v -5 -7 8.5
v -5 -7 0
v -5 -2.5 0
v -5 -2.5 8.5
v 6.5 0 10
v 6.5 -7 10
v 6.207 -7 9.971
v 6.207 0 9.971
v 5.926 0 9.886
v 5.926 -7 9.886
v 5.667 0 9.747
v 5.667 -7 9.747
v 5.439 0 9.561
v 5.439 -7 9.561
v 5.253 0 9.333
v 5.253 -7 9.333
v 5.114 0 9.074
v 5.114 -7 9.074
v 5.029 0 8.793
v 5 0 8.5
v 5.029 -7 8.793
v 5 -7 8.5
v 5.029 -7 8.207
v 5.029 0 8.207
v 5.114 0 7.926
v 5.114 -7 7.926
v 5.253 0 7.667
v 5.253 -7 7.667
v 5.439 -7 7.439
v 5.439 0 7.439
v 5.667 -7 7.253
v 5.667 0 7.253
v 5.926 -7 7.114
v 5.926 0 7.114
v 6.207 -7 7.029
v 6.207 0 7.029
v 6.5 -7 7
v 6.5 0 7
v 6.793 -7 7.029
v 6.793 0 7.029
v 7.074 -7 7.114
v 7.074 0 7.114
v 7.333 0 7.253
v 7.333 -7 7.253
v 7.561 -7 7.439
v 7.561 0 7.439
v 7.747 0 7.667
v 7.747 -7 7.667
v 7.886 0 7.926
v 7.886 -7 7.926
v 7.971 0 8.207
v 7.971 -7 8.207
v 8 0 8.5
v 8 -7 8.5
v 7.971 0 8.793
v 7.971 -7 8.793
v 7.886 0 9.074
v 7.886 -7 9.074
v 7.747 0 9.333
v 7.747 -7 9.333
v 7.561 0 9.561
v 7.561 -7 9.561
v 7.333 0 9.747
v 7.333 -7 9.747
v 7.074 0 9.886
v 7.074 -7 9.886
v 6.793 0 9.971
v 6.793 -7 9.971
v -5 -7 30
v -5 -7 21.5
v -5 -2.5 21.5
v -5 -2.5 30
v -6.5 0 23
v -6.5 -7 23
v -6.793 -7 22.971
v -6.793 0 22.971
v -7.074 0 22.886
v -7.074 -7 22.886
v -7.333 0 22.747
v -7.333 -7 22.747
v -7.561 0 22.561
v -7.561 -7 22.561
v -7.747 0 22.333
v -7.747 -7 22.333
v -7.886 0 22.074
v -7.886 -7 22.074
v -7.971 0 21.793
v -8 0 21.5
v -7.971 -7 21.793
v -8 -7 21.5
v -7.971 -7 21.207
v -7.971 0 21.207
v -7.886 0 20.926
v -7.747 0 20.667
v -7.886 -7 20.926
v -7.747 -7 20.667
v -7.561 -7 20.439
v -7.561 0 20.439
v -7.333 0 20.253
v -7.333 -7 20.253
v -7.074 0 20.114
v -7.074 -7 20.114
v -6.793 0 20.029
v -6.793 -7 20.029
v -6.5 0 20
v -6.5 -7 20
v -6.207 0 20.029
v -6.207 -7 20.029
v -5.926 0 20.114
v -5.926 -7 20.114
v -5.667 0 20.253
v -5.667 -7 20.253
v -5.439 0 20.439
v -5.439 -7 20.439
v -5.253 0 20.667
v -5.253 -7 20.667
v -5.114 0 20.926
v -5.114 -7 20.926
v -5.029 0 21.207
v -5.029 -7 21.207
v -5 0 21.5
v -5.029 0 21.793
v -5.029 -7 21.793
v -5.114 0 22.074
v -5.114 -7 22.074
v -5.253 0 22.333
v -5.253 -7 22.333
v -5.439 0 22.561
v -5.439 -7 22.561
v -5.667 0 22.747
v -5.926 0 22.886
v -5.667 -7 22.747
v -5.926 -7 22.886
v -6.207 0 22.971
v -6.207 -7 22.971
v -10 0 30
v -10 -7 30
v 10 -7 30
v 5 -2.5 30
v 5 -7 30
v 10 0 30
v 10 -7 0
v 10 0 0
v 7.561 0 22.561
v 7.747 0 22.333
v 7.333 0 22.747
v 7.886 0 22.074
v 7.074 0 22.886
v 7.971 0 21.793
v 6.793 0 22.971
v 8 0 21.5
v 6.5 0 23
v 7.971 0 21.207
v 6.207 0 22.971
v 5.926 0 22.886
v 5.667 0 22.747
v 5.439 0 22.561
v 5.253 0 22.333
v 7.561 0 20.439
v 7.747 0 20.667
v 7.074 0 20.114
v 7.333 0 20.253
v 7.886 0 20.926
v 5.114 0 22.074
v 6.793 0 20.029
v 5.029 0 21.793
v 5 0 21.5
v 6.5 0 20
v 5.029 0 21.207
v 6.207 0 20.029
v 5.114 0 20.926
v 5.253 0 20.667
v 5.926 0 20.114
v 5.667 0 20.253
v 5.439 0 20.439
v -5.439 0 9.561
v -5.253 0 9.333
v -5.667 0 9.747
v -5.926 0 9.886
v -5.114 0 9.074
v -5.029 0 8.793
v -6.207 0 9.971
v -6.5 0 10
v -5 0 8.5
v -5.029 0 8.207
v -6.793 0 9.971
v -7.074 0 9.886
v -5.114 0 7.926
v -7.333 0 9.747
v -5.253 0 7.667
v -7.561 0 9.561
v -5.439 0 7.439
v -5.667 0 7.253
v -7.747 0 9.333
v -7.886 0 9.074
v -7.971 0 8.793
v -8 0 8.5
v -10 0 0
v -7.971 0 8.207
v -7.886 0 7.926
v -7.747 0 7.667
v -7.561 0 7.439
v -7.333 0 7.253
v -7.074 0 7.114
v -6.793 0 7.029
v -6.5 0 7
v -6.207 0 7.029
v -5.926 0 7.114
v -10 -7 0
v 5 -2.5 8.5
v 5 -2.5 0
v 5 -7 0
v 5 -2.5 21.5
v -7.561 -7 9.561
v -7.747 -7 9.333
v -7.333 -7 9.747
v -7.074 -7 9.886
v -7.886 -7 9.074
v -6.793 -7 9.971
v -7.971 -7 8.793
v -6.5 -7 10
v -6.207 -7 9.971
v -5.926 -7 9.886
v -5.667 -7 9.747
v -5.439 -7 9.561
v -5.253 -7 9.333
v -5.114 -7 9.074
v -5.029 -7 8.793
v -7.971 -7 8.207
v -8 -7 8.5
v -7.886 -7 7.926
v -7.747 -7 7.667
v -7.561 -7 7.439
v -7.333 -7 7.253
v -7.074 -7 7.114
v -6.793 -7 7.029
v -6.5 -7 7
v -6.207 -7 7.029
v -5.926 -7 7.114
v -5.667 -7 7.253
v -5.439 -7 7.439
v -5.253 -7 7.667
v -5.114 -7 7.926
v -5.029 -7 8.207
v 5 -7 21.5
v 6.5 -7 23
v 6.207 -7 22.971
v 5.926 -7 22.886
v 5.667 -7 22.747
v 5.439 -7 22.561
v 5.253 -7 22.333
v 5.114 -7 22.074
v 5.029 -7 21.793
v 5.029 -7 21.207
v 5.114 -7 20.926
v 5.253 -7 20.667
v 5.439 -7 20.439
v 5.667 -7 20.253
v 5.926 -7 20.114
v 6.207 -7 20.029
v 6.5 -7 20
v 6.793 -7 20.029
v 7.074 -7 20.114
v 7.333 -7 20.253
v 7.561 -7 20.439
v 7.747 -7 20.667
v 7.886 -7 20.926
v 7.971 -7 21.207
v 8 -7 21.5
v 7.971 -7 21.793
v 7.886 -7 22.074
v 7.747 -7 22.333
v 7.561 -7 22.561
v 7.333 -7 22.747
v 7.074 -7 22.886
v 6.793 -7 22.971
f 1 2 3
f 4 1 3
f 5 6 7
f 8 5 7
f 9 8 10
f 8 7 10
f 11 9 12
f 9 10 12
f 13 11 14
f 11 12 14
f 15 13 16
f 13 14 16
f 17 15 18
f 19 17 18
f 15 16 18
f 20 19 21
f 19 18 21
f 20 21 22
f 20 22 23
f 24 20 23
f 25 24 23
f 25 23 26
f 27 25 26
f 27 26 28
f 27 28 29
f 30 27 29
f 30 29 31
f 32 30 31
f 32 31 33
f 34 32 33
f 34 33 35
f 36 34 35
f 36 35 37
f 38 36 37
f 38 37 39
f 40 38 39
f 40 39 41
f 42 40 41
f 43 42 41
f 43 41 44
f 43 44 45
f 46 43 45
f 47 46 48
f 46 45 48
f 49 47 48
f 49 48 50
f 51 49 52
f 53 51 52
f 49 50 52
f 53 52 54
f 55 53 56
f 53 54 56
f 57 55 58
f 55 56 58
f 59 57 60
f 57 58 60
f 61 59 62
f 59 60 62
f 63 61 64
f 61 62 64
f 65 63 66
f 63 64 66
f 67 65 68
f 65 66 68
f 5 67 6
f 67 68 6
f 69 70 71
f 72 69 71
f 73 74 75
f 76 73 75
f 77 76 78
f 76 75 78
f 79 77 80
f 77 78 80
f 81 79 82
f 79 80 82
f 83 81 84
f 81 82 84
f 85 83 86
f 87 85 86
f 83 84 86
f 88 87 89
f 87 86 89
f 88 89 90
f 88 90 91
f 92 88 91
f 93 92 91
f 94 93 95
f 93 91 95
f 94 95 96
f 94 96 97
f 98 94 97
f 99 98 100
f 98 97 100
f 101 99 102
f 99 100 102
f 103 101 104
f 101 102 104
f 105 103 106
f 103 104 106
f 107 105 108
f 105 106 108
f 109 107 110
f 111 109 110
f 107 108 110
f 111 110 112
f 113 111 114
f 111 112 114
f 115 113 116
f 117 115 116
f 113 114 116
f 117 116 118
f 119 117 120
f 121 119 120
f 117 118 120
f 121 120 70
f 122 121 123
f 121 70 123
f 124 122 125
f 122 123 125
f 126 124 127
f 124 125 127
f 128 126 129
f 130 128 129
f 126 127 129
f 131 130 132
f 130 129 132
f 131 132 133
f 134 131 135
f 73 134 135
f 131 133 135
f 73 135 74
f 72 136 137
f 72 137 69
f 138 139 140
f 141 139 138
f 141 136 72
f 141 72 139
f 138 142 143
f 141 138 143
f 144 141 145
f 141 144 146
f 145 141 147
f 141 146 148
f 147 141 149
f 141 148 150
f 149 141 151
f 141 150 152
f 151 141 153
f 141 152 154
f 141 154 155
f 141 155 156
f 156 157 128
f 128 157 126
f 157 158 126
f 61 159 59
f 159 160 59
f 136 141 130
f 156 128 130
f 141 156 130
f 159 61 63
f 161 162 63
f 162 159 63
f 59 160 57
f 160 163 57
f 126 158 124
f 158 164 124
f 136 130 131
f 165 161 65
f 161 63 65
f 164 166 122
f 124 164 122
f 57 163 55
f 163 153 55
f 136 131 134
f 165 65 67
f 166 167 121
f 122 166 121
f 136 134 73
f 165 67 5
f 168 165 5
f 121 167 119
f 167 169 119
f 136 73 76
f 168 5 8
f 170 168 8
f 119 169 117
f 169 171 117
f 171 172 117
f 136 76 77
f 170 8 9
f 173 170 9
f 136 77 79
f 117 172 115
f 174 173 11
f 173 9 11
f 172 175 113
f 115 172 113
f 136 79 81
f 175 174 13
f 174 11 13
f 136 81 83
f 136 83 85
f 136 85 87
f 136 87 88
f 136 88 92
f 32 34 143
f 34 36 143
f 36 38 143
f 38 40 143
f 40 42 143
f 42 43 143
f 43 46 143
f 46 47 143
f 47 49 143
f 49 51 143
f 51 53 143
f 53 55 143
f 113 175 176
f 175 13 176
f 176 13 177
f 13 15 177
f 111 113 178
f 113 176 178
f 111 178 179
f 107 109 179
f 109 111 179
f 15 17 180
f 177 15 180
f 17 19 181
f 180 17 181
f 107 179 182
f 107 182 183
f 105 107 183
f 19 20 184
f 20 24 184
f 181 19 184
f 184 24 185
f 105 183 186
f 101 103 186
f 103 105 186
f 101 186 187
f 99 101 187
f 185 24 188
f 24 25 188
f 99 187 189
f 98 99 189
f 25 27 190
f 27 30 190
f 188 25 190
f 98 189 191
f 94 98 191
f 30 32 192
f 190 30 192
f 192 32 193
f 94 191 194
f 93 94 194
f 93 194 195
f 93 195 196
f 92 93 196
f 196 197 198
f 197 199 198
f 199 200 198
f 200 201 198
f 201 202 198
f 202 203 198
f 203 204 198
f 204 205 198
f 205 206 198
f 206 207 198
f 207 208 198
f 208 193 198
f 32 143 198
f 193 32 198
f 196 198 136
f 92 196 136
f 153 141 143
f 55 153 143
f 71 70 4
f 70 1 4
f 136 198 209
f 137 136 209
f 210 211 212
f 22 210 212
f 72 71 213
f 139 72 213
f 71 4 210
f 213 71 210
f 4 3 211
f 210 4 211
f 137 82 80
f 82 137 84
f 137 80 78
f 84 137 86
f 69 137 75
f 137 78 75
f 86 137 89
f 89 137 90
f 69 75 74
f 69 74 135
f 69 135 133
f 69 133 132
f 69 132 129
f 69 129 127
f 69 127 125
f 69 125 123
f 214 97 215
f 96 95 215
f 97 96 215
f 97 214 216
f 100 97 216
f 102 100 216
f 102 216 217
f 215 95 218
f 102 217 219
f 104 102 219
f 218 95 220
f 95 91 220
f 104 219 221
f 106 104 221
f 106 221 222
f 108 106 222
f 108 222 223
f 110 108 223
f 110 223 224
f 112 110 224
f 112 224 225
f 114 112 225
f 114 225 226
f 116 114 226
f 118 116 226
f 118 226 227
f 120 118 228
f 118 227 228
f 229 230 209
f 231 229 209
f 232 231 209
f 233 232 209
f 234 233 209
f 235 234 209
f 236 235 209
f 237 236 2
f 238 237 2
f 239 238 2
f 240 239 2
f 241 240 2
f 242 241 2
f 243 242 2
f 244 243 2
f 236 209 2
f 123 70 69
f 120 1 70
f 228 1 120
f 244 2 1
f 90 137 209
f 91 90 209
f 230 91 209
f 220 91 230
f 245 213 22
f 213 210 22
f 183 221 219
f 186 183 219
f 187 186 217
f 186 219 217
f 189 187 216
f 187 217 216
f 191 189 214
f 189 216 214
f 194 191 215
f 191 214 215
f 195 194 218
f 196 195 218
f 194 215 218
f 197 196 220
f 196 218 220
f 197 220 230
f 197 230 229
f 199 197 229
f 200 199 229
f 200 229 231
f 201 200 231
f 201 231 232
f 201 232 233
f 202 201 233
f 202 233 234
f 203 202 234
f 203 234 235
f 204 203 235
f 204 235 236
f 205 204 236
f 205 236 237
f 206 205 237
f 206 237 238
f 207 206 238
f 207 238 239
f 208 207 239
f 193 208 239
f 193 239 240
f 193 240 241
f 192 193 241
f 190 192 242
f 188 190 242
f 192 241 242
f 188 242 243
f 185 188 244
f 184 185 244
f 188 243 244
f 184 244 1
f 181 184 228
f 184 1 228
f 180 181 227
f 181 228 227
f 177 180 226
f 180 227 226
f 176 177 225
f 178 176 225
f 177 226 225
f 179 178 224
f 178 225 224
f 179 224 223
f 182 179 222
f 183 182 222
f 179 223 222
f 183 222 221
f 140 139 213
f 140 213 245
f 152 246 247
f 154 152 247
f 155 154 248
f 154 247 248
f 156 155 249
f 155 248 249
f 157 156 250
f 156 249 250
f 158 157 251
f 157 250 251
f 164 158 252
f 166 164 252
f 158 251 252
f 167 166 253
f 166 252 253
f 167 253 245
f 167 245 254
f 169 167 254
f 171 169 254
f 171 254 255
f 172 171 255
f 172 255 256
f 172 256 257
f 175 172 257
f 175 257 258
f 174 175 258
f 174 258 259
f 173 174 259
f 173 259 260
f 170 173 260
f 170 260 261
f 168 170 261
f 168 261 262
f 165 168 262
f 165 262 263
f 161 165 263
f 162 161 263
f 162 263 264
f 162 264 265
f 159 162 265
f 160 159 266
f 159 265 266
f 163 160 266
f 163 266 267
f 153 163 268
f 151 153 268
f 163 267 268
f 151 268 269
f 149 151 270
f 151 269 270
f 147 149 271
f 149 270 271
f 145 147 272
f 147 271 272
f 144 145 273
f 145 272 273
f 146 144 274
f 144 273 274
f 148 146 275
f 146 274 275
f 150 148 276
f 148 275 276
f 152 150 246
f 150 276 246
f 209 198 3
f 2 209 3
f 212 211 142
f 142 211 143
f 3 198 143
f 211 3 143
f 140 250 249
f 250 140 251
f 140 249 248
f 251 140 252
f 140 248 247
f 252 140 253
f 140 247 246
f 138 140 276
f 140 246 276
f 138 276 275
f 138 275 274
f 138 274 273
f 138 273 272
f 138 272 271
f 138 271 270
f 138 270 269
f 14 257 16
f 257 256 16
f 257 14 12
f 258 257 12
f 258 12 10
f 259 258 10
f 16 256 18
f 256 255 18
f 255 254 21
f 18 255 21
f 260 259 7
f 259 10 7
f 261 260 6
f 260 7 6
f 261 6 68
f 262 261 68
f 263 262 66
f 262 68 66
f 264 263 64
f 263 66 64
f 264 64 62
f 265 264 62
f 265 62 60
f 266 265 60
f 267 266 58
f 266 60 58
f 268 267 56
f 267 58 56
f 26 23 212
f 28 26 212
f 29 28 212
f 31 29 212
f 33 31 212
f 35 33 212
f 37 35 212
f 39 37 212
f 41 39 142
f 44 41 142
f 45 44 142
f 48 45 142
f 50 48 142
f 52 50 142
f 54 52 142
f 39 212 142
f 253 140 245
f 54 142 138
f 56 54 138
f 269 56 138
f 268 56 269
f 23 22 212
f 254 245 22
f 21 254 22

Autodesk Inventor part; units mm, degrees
ref_plane "YZ Plane" through (0, 0, 0) normal (1, 0, 0) x (0, 1, 0)
ref_plane "XZ Plane" through (0, 0, 0) normal (0, 1, 0) x (-1, 0, 0)
ref_plane "XY Plane" through (0, 0, 0) normal (0, 0, 1) x (1, 0, 0)
sketch "スケッチ1" plane through (0, 0, 0) normal (0, 0, 1) x (1, 0, 0)
  line L0 (-10, -7) -> (-5, -7)
  line L1 (10, -7) -> (10, 0)
  line L2 (10, 0) -> (-10, 0)
  line L3 (-10, 0) -> (-10, -7)
  line L4 (-10, -7) -> (10, 0) construction
  line L5 (10, -7) -> (-10, 0) construction
  line L6 (-5, -2.5) -> (5, -2.5)
  line L7 (5, -2.5) -> (5, -7)
  line L8 (-5, -7) -> (-5, -2.5)
  line L9 (-5, -2.5) -> (5, -7) construction
  line L10 (5, -2.5) -> (-5, -7) construction
  line L11 (5, -7) -> (10, -7)
  point P0 (0, 0)
  point P1 (0, -3.5)
  point P2 (0, -4.75)
  dimension "d0" = 20
  dimension "d1" = 7
  dimension "d2" = 10
  dimension "d3" = 4.5
extrude "押し出し1" add sketch "スケッチ1" along normal blind 30
sketch "スケッチ2" plane through (-10, 0, 0) normal (0, 1, 0) x (1, 0, 0)
  line L0 (0, 0) -> (0, -30) projected
  line L1 (20, 0) -> (0, 0) projected
  line L2 (20, -30) -> (0, -30) projected
  line L3 (20, 0) -> (20, -30) projected
  point P0 (10, 0)
  point P1 (3.5, -8.5)
  point P2 (3.5, -21.5)
  point P3 (16.5, -21.5)
  point P4 (16.5, -8.5)
  dimension "d6" = 3.5
  dimension "d7" = 3.5
  dimension "d8" = 8.5
  dimension "d9" = 8.5
  dimension "d10" = 3.5
  dimension "d11" = 3.5
  dimension "d12" = 8.5
  dimension "d13" = 8.5
hole "穴1" at (-6.5, 0, 8.5) at (-6.5, 0, 21.5) at (6.5, 0, 21.5) at (6.5, 0, 8.5) direction (0, -1, 0) diameter 3 end through all
equation "\"d7\" = d6"
equation "\"d9\" = d8"
equation "\"d10\" = d6"
equation "\"d11\" = d6"
equation "\"d12\" = d8"
equation "\"d13\" = d8"
properties part number "slider_b7p5x20_30_sa" material "アルミニウム 6061-AHC"
